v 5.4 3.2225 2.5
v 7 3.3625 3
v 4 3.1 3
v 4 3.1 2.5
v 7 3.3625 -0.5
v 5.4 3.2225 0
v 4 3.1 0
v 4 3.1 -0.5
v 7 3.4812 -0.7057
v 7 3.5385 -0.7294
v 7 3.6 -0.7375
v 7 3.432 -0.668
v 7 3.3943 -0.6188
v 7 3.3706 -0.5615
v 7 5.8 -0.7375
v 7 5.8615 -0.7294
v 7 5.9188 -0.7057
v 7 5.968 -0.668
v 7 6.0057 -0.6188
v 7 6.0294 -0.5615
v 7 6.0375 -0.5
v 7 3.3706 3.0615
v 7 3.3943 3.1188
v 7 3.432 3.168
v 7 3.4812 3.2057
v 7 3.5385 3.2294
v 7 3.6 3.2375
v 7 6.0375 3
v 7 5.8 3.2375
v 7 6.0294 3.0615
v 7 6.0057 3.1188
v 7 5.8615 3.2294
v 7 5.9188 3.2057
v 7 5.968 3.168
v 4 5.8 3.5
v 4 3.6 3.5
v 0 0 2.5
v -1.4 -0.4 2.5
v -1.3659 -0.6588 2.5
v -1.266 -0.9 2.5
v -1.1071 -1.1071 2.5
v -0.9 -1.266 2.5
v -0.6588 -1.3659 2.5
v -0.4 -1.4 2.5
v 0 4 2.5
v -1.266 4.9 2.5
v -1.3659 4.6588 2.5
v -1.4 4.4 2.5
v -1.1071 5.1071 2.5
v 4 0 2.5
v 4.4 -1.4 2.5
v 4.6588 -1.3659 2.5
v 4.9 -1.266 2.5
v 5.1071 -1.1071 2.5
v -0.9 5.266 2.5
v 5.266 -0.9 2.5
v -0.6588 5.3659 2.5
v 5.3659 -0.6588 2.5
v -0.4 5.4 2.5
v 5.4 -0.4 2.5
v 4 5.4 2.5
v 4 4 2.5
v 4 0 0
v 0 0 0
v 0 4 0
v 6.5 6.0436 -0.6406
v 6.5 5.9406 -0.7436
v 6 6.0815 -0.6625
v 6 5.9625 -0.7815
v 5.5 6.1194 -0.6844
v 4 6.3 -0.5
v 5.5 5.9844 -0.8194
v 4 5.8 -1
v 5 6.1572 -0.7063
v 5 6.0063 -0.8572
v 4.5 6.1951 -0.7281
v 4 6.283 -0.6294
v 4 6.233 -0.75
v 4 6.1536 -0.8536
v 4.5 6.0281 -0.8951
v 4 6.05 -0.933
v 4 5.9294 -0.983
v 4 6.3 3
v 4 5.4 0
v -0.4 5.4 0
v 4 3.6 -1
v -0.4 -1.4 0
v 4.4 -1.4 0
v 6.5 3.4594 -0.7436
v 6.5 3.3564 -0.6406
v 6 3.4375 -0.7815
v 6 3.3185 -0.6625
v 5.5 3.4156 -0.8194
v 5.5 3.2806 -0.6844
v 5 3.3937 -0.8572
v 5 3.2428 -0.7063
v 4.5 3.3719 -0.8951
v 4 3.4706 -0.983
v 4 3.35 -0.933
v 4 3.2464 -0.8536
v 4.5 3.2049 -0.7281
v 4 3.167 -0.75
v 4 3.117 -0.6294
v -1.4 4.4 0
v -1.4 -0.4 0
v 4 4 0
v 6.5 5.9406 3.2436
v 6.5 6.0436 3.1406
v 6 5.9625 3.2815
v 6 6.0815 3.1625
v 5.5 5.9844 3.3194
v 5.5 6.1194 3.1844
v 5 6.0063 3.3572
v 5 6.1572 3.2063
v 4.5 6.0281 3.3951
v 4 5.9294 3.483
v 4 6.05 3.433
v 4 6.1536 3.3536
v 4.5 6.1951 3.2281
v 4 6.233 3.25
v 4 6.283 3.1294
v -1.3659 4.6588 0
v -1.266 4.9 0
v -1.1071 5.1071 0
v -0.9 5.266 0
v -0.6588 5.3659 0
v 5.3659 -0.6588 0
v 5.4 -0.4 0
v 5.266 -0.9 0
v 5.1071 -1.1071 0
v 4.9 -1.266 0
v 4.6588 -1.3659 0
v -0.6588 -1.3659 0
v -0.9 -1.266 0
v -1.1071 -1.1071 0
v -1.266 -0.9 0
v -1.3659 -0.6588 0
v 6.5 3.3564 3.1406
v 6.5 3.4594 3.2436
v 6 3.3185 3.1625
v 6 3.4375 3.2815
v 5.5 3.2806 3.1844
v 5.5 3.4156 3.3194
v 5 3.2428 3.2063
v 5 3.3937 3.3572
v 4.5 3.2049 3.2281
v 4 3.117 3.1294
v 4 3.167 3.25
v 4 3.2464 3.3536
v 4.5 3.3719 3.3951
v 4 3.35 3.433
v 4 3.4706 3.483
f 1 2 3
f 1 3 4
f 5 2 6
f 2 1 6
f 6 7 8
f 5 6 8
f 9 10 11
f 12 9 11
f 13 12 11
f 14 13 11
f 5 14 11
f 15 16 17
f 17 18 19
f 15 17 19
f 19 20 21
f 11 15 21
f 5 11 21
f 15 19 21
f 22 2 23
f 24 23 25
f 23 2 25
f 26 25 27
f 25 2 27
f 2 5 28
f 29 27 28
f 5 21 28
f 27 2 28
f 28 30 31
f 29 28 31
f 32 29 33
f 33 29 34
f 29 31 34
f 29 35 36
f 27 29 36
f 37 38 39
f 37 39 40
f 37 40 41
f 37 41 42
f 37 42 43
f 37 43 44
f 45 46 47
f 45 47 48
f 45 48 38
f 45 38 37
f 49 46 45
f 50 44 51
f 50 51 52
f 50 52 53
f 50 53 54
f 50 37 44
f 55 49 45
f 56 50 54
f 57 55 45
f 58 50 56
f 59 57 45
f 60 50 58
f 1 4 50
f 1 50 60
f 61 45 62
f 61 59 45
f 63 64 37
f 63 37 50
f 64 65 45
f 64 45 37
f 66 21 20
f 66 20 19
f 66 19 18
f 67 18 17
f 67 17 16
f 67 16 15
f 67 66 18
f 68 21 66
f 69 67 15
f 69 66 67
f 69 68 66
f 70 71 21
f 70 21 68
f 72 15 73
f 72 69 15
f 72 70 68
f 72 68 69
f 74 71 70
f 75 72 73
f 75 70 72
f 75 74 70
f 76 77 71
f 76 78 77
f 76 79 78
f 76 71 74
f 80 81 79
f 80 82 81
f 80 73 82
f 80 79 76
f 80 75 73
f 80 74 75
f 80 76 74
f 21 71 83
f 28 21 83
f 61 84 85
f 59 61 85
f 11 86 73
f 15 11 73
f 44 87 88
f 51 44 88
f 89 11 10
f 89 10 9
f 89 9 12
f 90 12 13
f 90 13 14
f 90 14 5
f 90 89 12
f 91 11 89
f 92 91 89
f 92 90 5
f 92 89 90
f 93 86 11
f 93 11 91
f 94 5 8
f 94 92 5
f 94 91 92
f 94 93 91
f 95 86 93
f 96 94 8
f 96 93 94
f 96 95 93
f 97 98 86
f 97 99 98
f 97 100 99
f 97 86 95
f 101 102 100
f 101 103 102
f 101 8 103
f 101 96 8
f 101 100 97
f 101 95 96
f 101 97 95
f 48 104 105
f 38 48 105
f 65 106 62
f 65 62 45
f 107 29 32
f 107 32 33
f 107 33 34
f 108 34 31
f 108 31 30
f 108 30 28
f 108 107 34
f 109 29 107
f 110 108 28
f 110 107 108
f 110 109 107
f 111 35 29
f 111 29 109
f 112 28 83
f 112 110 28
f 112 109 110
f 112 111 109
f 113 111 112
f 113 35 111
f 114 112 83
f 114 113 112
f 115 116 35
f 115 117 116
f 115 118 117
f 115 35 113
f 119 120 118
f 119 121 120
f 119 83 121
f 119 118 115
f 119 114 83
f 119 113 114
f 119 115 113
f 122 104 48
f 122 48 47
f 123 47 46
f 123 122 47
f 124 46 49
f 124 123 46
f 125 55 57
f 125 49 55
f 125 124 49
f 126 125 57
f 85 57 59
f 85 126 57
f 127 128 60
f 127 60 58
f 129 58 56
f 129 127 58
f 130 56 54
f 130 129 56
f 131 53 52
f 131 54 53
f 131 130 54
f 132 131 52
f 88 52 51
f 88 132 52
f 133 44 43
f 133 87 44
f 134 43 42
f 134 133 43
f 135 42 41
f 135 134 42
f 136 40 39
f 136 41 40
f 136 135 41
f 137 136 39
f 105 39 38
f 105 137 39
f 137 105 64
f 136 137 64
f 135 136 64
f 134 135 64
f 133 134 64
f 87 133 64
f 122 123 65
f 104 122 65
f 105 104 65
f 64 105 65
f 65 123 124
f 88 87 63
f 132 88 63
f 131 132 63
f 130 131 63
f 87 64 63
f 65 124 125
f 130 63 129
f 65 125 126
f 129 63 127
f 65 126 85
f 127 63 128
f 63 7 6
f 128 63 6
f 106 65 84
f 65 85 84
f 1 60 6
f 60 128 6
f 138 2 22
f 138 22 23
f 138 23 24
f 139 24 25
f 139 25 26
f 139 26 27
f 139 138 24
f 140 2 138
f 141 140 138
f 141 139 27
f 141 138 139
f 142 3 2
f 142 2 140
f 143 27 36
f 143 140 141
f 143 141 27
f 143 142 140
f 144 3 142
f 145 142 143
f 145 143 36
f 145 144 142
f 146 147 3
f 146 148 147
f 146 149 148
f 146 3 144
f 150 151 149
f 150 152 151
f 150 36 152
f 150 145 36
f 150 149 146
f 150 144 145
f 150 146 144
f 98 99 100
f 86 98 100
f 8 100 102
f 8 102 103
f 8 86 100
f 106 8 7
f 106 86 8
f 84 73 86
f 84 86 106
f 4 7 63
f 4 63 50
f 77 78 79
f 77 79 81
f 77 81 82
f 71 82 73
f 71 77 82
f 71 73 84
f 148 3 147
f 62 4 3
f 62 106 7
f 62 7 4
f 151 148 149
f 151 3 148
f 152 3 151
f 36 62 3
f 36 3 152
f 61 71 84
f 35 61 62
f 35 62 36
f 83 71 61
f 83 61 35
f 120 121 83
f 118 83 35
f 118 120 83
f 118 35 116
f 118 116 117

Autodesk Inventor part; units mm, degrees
ref_plane "YZ Plane" through (0, 0, 0) normal (1, 0, 0) x (0, 1, 0)
ref_plane "XZ Plane" through (0, 0, 0) normal (0, 1, 0) x (-1, 0, 0)
ref_plane "XY Plane" through (0, 0, 0) normal (0, 0, 1) x (1, 0, 0)
sketch "Sketch1" plane through (0, 0, 0) normal (0, 0, 1) x (1, 0, 0)
  line L0 (0, 0) -> (4, 0)
  line L1 (4, 0) -> (4, 4)
  line L2 (4, 4) -> (0, 4)
  line L3 (0, 4) -> (0, 0)
  line L4 (-0.4, -1.4) -> (4.4, -1.4)
  line L5 (5.4, -0.4) -> (5.4, 5.4)
  line L6 (5.4, 5.4) -> (-0.4, 5.4)
  line L7 (-1.4, 4.4) -> (-1.4, -0.4)
  arc A0 (-0.4, 5.4) -> (-1.4, 4.4) centre (-0.4, 4.4) ccw
  arc A1 (-1.4, -0.4) -> (-0.4, -1.4) centre (-0.4, -0.4) ccw
  arc A2 (4.4, -1.4) -> (5.4, -0.4) centre (4.4, -0.4) ccw
  point P0 (-1.4, -1.4)
  point P1 (5.4, -1.4)
  point P2 (-1.4, 5.4)
  dimension "d0" = 4
  dimension "d1" = 4
  dimension "d2" = 1.4
  dimension "d5" = 1
extrude "Extrusion1" add sketch "Sketch1" along normal blind 2.5
sketch "草圖3" plane through (4, 4, 0) normal (-1, 0, 0) x (0, 0, 1)
  line L0 (2.5, 0) -> (2.5, -4) projected
  line L1 (-0.5, 2.3) -> (3, 2.3)
  line L2 (3.5, 1.8) -> (3.5, -0.4)
  line L3 (3, -0.9) -> (-0.5, -0.9)
  line L4 (-1, -0.4) -> (-1, 1.8)
  line L5 (0, -5.4) -> (2.5, -5.4) projected
  arc A0 (-0.5, 2.3) -> (-1, 1.8) centre (-0.5, 1.8) ccw
  arc A1 (-1, -0.4) -> (-0.5, -0.9) centre (-0.5, -0.4) ccw
  arc A2 (3, -0.9) -> (3.5, -0.4) centre (3, -0.4) ccw
  arc A3 (3.5, 1.8) -> (3, 2.3) centre (3, 1.8) ccw
  point P0 (-1, 2.3)
  point P1 (3.5, -0.9)
  point P2 (3.5, 2.3)
  dimension "d14" = 4.5
  dimension "d16" = 3.2
  dimension "d17" = 4.5
  dimension "d18" = 1
  dimension "d19" = 0.5
extrude "擠出3" add sketch "草圖3" against normal blind 3 draft -5
properties part number "fastener_04"
